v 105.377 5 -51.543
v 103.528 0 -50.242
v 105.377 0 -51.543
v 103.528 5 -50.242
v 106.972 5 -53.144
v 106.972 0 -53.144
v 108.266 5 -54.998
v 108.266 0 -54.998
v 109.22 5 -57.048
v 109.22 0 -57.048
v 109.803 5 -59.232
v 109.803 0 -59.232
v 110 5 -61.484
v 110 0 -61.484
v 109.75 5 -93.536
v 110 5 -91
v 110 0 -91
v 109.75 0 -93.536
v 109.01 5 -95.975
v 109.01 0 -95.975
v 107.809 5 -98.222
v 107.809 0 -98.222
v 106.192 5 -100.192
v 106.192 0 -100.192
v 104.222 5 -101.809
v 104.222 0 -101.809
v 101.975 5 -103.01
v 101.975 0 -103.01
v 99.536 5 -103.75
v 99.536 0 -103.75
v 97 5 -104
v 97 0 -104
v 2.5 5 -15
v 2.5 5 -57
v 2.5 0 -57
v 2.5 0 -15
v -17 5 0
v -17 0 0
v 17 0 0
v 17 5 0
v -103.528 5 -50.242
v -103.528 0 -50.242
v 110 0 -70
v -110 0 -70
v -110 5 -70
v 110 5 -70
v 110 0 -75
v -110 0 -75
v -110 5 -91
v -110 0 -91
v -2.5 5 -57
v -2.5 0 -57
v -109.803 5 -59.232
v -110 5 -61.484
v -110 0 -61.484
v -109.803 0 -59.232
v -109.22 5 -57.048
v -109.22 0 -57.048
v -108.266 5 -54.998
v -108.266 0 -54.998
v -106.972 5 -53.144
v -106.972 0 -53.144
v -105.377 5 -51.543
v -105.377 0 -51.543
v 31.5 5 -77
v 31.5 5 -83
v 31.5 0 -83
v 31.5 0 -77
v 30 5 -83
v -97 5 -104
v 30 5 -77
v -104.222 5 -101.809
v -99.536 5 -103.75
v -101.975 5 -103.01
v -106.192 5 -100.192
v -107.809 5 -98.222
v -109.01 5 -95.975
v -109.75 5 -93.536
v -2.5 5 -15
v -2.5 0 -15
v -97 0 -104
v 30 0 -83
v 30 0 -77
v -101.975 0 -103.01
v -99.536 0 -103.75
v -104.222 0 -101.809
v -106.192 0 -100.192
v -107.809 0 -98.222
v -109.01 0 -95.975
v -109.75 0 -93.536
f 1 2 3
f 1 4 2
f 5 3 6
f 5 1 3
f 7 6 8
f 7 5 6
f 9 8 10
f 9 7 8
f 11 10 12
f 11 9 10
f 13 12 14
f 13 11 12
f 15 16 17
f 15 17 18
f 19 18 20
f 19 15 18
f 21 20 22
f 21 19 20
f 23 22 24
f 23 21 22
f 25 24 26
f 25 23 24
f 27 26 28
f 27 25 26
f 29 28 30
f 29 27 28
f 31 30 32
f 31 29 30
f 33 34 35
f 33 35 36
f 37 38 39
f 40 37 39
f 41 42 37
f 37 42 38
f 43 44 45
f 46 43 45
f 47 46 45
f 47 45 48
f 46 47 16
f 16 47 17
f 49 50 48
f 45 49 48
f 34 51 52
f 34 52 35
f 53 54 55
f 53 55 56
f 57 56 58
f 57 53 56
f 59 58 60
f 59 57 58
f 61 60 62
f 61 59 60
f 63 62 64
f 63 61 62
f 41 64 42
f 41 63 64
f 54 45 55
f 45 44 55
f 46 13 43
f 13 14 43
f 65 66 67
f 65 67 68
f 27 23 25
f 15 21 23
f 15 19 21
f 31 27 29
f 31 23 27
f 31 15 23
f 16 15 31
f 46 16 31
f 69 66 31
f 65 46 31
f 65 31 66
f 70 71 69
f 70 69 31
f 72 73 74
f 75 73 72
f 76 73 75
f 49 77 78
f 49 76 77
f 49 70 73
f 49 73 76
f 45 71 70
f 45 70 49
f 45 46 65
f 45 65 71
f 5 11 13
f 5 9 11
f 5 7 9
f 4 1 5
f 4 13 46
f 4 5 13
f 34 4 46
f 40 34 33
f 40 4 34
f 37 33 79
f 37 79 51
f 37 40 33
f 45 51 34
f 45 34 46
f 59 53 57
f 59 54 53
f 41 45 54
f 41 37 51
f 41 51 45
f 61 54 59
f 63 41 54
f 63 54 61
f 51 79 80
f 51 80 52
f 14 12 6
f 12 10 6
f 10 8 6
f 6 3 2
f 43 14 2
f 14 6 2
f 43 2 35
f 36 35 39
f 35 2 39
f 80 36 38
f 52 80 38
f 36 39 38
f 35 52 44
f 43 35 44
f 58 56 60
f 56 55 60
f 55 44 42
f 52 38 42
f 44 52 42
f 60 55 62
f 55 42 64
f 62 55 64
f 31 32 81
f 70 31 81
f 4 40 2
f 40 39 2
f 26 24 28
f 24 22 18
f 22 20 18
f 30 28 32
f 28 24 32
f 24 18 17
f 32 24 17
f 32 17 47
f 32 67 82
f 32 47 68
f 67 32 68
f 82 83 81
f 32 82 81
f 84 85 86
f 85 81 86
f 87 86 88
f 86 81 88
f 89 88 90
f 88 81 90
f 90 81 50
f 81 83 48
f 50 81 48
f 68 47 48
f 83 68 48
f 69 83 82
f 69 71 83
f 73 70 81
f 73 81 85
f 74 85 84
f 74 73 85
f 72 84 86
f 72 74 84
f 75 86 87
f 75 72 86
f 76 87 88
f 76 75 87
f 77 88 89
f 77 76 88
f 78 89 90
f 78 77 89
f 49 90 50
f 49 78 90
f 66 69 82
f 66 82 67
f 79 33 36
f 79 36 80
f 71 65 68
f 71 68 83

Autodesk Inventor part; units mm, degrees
ref_plane "YZ Plane" through (0, 0, 0) normal (1, 0, 0) x (0, 1, 0)
ref_plane "XZ Plane" through (0, 0, 0) normal (0, 1, 0) x (-1, 0, 0)
sketch "Sketch1" plane through (0, 0, 0) normal (0, 1, 0) x (-1, 0, 0)
  line L0 (17, 0) -> (-17, 0)
  line L1 (-17, 0) -> (-110, -54)
  line L2 (-110, -54) -> (-110, -104)
  line L3 (-110, -104) -> (110, -104)
  line L4 (110, -104) -> (110, -54)
  line L5 (110, -54) -> (17, 0)
  point P0 (0, 0)
  dimension "d0" = 220
  dimension "d1" = 104
  dimension "d4" = 34
  dimension "d5" = 17
  dimension "d8" = 50
extrude "Extrusion1" add sketch "Sketch1" along normal blind 5
fillet "Fillet1" radius 13 4 edges at (-110, 2.5, -104) (110, 2.5, -104) (110, 2.5, -54) (-110, 2.5, -54)
sketch "Sketch2" plane through (0, 5, 0) normal (0, 1, 0) x (1, 0, 0)
  line L0 (-2.5, 57) -> (2.5, 57)
  line L1 (2.5, 57) -> (2.5, 15)
  line L2 (2.5, 15) -> (-2.5, 15)
  line L3 (-2.5, 15) -> (-2.5, 57)
  line L4 (-17, 0) -> (17, 0) projected
  line L5 (0, 0) -> (0, 5.9435) construction
  line L6 (30, 83) -> (31.5, 83)
  line L7 (31.5, 83) -> (31.5, 77)
  line L8 (31.5, 77) -> (30, 77)
  line L9 (30, 77) -> (30, 83)
  line L10 (110, 61.4842) -> (110, 91) projected
  line L11 (97, 104) -> (-97, 104) projected
  point P0 (0, 0)
  point P1 (0, 15)
  dimension "d12" = 5
  dimension "d13" = 42
  dimension "d14" = 15
  dimension "d28" = 1.5
  dimension "d29" = 78.5
  dimension "d30" = 21
  dimension "d31" = 6
extrude "Extrusion2" cut sketch "Sketch2" against normal through all
sketch "Sketch3" plane through (110, 0, -61.4842) normal (1, 0, 0) x (0, 0, -1)
  line L0 (42.5158, 0) -> (42.5158, 5) projected
  line L1 (0, 5) -> (29.5158, 5) projected
  line L2 (29.5158, 0) -> (0, 0) projected
  line L3 (29.5158, 5) -> (0, 5) projected
  line L4 (8.5158, 0) -> (8.5158, 5)
  line L5 (8.5158, 0) -> (13.5158, 0)
  line L6 (0, 0) -> (29.5158, 0) projected
  line L7 (8.5158, 5) -> (13.5158, 0)
  point P0 (-61.4842, 0)
  dimension "d26" = 45
  dimension "d27" = 34
extrude "Extrusion3" cut sketch "Sketch3" against normal through all
ref_plane "Work Plane1" through (110, 0, -70) normal (0, 0, -1) x (-1, 0, 0)
split body "Split1" result two bodies by plane through (110, 0, -70) normal (0, 0, -1) first body at (-59, 4.5, -83.6667)
equation "\"d5\" = 0.5 * d4"
equation "\"d9\" = Thickness"
equation "\"d12\" = Thickness"
equation "\"d23\" = Thickness"
equation "\"Thickness\" = 5"
properties part number "horizontal_stabilizer" material "Foam board"
